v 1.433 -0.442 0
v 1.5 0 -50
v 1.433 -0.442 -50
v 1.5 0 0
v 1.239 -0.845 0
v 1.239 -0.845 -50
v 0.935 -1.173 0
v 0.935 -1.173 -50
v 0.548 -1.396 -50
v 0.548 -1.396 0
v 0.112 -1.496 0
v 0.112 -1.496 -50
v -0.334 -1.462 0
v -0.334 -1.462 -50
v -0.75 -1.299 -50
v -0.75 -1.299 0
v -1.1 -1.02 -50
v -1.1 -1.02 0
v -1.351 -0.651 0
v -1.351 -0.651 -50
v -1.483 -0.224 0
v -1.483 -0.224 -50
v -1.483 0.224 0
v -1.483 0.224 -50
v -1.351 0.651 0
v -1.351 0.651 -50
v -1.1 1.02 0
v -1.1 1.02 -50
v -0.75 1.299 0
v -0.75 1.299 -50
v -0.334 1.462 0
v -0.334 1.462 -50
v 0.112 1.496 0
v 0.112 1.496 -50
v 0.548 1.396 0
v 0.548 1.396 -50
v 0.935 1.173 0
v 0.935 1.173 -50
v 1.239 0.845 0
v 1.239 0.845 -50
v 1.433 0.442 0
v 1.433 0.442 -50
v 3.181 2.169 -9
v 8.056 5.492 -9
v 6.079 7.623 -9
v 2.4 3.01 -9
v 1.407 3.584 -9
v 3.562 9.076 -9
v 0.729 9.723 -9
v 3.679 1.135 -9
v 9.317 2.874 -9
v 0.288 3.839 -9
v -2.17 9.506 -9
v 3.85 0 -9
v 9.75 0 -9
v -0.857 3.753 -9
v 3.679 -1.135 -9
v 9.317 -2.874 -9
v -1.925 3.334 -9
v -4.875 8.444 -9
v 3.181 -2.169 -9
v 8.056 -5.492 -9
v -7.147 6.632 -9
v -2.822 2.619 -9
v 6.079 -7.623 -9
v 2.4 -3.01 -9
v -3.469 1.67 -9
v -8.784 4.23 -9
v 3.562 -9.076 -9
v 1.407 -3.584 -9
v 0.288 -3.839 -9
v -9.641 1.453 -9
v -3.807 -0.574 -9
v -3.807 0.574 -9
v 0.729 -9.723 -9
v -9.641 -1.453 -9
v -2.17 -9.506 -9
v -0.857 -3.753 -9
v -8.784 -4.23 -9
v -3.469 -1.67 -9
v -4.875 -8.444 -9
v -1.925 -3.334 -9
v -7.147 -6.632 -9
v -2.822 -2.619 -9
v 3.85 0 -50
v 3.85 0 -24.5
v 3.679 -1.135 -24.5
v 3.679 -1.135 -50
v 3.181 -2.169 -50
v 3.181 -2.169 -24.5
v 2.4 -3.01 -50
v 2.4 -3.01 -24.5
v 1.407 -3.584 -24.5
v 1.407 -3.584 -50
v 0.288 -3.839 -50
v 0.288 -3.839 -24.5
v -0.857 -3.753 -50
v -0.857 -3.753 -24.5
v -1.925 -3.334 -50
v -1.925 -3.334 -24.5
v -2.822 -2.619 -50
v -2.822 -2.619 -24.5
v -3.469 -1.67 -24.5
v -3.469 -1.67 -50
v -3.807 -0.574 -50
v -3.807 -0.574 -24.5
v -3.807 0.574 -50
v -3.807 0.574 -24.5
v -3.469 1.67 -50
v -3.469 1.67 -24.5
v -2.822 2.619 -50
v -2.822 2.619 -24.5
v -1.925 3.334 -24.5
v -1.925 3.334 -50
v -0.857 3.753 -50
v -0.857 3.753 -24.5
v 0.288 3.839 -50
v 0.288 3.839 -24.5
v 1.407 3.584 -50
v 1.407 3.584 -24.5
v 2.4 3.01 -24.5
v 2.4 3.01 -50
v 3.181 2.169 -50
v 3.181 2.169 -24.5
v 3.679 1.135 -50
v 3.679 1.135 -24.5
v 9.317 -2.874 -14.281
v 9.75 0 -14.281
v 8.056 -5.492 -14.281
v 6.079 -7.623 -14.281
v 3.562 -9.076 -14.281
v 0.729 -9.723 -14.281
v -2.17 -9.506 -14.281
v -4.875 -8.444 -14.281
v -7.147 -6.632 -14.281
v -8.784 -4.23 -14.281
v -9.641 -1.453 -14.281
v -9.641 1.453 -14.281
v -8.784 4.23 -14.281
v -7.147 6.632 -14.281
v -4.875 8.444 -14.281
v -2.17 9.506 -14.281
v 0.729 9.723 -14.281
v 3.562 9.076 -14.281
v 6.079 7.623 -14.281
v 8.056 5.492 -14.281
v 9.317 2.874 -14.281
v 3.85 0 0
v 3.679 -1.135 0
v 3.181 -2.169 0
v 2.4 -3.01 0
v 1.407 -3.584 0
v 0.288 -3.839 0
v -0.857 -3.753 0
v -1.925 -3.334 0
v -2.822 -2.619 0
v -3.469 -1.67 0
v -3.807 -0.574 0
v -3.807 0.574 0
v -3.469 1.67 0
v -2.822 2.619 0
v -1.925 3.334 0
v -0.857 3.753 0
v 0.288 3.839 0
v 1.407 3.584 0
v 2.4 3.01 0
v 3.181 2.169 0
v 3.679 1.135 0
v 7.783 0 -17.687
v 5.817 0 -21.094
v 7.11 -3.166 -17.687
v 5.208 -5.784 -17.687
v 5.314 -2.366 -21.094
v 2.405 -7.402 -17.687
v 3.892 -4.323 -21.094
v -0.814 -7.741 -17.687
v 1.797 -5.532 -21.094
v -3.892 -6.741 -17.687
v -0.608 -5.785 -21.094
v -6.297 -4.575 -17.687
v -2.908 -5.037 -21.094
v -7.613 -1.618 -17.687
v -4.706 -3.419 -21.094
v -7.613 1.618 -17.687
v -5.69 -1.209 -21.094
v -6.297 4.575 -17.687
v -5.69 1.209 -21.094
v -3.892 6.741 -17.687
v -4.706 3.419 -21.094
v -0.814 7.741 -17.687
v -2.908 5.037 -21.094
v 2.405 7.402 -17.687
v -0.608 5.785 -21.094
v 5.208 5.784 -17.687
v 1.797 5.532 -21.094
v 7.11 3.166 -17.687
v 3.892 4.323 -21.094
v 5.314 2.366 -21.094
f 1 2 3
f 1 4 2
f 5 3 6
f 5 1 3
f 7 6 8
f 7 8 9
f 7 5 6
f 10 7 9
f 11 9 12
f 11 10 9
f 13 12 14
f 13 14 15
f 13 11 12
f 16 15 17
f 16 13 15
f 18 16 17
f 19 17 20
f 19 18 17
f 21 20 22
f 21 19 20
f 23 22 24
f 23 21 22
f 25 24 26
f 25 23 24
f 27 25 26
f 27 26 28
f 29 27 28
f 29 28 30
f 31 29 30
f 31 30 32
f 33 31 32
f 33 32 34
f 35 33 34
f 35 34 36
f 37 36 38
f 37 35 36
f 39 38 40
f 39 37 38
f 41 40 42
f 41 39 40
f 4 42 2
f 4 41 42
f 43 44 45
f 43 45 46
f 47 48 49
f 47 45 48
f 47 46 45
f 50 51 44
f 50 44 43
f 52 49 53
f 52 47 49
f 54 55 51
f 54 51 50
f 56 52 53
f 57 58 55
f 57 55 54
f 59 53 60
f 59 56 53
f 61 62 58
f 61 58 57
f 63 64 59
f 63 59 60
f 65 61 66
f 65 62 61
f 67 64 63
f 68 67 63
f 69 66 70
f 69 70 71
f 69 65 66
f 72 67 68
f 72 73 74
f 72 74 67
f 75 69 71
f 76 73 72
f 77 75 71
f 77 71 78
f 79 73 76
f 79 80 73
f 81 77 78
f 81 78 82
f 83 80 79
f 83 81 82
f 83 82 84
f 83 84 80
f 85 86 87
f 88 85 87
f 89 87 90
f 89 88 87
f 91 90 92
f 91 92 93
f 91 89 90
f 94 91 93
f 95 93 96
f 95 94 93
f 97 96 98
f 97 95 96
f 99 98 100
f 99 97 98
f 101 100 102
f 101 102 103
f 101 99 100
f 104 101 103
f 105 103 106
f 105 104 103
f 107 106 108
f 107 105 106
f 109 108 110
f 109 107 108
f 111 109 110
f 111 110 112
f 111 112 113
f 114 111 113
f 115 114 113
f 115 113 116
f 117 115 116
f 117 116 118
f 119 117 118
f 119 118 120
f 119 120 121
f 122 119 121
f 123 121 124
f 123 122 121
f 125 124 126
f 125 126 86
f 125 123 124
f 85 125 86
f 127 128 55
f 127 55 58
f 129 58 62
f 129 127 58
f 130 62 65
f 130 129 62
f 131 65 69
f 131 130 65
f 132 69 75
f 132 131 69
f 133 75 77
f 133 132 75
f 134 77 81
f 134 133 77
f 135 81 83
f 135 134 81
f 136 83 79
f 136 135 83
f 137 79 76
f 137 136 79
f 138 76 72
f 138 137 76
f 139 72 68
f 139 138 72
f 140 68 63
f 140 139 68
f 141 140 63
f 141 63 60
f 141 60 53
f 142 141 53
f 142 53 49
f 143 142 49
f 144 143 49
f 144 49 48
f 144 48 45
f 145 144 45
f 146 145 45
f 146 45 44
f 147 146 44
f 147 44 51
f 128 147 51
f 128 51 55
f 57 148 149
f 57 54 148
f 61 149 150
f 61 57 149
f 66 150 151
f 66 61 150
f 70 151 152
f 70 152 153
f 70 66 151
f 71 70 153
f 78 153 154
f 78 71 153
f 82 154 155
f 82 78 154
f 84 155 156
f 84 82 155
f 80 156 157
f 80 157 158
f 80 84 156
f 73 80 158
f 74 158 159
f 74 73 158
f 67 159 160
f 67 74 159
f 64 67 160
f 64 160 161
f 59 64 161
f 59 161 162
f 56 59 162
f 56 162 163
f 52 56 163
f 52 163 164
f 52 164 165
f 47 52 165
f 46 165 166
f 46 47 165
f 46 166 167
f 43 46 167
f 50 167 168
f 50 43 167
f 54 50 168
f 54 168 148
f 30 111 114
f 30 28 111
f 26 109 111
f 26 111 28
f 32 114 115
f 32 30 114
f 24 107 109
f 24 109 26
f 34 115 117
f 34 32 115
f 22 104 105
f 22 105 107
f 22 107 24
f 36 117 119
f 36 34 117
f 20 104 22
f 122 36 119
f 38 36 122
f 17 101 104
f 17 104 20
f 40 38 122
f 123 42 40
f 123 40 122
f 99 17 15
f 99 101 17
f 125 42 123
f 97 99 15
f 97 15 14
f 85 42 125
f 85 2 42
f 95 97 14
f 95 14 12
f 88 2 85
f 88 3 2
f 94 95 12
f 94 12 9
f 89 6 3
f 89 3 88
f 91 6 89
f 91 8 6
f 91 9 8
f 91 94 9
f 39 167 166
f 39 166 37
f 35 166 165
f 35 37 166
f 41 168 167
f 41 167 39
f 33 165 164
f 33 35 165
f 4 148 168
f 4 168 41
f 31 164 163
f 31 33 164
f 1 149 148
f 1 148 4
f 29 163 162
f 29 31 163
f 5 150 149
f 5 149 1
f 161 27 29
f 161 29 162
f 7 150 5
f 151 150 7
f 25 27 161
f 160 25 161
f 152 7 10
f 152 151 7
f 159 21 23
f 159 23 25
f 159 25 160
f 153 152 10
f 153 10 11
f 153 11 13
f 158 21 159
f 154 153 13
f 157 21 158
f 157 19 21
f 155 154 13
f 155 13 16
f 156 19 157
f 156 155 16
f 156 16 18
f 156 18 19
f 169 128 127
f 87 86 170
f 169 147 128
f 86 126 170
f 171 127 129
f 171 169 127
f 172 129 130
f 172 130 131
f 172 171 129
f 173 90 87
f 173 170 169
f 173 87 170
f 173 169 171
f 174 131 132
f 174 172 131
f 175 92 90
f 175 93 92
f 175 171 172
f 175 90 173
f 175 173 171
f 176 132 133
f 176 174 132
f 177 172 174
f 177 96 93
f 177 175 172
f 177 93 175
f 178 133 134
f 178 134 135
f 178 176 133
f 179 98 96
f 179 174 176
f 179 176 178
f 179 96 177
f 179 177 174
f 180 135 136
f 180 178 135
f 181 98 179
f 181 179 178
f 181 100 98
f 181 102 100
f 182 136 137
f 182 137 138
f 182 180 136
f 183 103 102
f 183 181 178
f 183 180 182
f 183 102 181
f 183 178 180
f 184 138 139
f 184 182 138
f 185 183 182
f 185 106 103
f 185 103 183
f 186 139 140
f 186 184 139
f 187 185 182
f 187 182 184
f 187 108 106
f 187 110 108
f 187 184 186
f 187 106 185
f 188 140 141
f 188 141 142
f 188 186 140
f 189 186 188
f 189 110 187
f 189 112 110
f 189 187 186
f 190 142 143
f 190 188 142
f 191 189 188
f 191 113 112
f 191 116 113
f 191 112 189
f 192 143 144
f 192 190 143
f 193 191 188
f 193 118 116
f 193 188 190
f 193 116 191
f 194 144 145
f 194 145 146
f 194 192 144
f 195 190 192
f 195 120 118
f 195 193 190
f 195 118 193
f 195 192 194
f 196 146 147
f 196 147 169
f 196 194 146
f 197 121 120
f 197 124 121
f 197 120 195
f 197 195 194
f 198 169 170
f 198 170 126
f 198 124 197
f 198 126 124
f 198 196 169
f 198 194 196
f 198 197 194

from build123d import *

# Parameters (mm, degrees)
CHAMFER1_SIZE   = 6.062177826
CHAMFER1_SIZE_2 = 10.5


with BuildPart() as part:
    # Sketch2 → Revolve1 (revolve)
    with BuildSketch(Plane(origin=(0, 0, 0), x_dir=(1, 0, 0), z_dir=(0, 1, 0))):
        Polygon((1.5, 0), (3.85, 0), (3.85, 9), (9.75, 9), (9.75, 14), (3.85, 14), (3.85, 50), (1.5, 50), align=None)
    revolve(axis=Axis((0, 0, 0), (0, 0, -1)))

    # Chamfer1
    # the kernel refuses this chamfer: 10.5, 6.062177826 mm, written as the material it adds along each edge
    with BuildSketch(Plane(origin=(0, 0, -14), x_dir=(1, 0, 0), z_dir=(0, 1, 0))) as chamfer1_piece_1_section:
        Polygon((3.85 + CHAMFER1_SIZE, 0), (3.85, CHAMFER1_SIZE_2), (3.85, 0), align=None)
    chamfer1_piece_1 = revolve(axis=Axis((0, 0, -14), (0, 0, -1)), mode=Mode.PRIVATE)
    chamfer1_piece_1 = chamfer1_piece_1 & Plane(origin=(0, 0, -19.51769374), x_dir=(1, 0, 0), z_dir=(0, 0, -1)) * Cylinder(9.75, 42, mode=Mode.PRIVATE)
    add(chamfer1_piece_1)


solid = part.part
